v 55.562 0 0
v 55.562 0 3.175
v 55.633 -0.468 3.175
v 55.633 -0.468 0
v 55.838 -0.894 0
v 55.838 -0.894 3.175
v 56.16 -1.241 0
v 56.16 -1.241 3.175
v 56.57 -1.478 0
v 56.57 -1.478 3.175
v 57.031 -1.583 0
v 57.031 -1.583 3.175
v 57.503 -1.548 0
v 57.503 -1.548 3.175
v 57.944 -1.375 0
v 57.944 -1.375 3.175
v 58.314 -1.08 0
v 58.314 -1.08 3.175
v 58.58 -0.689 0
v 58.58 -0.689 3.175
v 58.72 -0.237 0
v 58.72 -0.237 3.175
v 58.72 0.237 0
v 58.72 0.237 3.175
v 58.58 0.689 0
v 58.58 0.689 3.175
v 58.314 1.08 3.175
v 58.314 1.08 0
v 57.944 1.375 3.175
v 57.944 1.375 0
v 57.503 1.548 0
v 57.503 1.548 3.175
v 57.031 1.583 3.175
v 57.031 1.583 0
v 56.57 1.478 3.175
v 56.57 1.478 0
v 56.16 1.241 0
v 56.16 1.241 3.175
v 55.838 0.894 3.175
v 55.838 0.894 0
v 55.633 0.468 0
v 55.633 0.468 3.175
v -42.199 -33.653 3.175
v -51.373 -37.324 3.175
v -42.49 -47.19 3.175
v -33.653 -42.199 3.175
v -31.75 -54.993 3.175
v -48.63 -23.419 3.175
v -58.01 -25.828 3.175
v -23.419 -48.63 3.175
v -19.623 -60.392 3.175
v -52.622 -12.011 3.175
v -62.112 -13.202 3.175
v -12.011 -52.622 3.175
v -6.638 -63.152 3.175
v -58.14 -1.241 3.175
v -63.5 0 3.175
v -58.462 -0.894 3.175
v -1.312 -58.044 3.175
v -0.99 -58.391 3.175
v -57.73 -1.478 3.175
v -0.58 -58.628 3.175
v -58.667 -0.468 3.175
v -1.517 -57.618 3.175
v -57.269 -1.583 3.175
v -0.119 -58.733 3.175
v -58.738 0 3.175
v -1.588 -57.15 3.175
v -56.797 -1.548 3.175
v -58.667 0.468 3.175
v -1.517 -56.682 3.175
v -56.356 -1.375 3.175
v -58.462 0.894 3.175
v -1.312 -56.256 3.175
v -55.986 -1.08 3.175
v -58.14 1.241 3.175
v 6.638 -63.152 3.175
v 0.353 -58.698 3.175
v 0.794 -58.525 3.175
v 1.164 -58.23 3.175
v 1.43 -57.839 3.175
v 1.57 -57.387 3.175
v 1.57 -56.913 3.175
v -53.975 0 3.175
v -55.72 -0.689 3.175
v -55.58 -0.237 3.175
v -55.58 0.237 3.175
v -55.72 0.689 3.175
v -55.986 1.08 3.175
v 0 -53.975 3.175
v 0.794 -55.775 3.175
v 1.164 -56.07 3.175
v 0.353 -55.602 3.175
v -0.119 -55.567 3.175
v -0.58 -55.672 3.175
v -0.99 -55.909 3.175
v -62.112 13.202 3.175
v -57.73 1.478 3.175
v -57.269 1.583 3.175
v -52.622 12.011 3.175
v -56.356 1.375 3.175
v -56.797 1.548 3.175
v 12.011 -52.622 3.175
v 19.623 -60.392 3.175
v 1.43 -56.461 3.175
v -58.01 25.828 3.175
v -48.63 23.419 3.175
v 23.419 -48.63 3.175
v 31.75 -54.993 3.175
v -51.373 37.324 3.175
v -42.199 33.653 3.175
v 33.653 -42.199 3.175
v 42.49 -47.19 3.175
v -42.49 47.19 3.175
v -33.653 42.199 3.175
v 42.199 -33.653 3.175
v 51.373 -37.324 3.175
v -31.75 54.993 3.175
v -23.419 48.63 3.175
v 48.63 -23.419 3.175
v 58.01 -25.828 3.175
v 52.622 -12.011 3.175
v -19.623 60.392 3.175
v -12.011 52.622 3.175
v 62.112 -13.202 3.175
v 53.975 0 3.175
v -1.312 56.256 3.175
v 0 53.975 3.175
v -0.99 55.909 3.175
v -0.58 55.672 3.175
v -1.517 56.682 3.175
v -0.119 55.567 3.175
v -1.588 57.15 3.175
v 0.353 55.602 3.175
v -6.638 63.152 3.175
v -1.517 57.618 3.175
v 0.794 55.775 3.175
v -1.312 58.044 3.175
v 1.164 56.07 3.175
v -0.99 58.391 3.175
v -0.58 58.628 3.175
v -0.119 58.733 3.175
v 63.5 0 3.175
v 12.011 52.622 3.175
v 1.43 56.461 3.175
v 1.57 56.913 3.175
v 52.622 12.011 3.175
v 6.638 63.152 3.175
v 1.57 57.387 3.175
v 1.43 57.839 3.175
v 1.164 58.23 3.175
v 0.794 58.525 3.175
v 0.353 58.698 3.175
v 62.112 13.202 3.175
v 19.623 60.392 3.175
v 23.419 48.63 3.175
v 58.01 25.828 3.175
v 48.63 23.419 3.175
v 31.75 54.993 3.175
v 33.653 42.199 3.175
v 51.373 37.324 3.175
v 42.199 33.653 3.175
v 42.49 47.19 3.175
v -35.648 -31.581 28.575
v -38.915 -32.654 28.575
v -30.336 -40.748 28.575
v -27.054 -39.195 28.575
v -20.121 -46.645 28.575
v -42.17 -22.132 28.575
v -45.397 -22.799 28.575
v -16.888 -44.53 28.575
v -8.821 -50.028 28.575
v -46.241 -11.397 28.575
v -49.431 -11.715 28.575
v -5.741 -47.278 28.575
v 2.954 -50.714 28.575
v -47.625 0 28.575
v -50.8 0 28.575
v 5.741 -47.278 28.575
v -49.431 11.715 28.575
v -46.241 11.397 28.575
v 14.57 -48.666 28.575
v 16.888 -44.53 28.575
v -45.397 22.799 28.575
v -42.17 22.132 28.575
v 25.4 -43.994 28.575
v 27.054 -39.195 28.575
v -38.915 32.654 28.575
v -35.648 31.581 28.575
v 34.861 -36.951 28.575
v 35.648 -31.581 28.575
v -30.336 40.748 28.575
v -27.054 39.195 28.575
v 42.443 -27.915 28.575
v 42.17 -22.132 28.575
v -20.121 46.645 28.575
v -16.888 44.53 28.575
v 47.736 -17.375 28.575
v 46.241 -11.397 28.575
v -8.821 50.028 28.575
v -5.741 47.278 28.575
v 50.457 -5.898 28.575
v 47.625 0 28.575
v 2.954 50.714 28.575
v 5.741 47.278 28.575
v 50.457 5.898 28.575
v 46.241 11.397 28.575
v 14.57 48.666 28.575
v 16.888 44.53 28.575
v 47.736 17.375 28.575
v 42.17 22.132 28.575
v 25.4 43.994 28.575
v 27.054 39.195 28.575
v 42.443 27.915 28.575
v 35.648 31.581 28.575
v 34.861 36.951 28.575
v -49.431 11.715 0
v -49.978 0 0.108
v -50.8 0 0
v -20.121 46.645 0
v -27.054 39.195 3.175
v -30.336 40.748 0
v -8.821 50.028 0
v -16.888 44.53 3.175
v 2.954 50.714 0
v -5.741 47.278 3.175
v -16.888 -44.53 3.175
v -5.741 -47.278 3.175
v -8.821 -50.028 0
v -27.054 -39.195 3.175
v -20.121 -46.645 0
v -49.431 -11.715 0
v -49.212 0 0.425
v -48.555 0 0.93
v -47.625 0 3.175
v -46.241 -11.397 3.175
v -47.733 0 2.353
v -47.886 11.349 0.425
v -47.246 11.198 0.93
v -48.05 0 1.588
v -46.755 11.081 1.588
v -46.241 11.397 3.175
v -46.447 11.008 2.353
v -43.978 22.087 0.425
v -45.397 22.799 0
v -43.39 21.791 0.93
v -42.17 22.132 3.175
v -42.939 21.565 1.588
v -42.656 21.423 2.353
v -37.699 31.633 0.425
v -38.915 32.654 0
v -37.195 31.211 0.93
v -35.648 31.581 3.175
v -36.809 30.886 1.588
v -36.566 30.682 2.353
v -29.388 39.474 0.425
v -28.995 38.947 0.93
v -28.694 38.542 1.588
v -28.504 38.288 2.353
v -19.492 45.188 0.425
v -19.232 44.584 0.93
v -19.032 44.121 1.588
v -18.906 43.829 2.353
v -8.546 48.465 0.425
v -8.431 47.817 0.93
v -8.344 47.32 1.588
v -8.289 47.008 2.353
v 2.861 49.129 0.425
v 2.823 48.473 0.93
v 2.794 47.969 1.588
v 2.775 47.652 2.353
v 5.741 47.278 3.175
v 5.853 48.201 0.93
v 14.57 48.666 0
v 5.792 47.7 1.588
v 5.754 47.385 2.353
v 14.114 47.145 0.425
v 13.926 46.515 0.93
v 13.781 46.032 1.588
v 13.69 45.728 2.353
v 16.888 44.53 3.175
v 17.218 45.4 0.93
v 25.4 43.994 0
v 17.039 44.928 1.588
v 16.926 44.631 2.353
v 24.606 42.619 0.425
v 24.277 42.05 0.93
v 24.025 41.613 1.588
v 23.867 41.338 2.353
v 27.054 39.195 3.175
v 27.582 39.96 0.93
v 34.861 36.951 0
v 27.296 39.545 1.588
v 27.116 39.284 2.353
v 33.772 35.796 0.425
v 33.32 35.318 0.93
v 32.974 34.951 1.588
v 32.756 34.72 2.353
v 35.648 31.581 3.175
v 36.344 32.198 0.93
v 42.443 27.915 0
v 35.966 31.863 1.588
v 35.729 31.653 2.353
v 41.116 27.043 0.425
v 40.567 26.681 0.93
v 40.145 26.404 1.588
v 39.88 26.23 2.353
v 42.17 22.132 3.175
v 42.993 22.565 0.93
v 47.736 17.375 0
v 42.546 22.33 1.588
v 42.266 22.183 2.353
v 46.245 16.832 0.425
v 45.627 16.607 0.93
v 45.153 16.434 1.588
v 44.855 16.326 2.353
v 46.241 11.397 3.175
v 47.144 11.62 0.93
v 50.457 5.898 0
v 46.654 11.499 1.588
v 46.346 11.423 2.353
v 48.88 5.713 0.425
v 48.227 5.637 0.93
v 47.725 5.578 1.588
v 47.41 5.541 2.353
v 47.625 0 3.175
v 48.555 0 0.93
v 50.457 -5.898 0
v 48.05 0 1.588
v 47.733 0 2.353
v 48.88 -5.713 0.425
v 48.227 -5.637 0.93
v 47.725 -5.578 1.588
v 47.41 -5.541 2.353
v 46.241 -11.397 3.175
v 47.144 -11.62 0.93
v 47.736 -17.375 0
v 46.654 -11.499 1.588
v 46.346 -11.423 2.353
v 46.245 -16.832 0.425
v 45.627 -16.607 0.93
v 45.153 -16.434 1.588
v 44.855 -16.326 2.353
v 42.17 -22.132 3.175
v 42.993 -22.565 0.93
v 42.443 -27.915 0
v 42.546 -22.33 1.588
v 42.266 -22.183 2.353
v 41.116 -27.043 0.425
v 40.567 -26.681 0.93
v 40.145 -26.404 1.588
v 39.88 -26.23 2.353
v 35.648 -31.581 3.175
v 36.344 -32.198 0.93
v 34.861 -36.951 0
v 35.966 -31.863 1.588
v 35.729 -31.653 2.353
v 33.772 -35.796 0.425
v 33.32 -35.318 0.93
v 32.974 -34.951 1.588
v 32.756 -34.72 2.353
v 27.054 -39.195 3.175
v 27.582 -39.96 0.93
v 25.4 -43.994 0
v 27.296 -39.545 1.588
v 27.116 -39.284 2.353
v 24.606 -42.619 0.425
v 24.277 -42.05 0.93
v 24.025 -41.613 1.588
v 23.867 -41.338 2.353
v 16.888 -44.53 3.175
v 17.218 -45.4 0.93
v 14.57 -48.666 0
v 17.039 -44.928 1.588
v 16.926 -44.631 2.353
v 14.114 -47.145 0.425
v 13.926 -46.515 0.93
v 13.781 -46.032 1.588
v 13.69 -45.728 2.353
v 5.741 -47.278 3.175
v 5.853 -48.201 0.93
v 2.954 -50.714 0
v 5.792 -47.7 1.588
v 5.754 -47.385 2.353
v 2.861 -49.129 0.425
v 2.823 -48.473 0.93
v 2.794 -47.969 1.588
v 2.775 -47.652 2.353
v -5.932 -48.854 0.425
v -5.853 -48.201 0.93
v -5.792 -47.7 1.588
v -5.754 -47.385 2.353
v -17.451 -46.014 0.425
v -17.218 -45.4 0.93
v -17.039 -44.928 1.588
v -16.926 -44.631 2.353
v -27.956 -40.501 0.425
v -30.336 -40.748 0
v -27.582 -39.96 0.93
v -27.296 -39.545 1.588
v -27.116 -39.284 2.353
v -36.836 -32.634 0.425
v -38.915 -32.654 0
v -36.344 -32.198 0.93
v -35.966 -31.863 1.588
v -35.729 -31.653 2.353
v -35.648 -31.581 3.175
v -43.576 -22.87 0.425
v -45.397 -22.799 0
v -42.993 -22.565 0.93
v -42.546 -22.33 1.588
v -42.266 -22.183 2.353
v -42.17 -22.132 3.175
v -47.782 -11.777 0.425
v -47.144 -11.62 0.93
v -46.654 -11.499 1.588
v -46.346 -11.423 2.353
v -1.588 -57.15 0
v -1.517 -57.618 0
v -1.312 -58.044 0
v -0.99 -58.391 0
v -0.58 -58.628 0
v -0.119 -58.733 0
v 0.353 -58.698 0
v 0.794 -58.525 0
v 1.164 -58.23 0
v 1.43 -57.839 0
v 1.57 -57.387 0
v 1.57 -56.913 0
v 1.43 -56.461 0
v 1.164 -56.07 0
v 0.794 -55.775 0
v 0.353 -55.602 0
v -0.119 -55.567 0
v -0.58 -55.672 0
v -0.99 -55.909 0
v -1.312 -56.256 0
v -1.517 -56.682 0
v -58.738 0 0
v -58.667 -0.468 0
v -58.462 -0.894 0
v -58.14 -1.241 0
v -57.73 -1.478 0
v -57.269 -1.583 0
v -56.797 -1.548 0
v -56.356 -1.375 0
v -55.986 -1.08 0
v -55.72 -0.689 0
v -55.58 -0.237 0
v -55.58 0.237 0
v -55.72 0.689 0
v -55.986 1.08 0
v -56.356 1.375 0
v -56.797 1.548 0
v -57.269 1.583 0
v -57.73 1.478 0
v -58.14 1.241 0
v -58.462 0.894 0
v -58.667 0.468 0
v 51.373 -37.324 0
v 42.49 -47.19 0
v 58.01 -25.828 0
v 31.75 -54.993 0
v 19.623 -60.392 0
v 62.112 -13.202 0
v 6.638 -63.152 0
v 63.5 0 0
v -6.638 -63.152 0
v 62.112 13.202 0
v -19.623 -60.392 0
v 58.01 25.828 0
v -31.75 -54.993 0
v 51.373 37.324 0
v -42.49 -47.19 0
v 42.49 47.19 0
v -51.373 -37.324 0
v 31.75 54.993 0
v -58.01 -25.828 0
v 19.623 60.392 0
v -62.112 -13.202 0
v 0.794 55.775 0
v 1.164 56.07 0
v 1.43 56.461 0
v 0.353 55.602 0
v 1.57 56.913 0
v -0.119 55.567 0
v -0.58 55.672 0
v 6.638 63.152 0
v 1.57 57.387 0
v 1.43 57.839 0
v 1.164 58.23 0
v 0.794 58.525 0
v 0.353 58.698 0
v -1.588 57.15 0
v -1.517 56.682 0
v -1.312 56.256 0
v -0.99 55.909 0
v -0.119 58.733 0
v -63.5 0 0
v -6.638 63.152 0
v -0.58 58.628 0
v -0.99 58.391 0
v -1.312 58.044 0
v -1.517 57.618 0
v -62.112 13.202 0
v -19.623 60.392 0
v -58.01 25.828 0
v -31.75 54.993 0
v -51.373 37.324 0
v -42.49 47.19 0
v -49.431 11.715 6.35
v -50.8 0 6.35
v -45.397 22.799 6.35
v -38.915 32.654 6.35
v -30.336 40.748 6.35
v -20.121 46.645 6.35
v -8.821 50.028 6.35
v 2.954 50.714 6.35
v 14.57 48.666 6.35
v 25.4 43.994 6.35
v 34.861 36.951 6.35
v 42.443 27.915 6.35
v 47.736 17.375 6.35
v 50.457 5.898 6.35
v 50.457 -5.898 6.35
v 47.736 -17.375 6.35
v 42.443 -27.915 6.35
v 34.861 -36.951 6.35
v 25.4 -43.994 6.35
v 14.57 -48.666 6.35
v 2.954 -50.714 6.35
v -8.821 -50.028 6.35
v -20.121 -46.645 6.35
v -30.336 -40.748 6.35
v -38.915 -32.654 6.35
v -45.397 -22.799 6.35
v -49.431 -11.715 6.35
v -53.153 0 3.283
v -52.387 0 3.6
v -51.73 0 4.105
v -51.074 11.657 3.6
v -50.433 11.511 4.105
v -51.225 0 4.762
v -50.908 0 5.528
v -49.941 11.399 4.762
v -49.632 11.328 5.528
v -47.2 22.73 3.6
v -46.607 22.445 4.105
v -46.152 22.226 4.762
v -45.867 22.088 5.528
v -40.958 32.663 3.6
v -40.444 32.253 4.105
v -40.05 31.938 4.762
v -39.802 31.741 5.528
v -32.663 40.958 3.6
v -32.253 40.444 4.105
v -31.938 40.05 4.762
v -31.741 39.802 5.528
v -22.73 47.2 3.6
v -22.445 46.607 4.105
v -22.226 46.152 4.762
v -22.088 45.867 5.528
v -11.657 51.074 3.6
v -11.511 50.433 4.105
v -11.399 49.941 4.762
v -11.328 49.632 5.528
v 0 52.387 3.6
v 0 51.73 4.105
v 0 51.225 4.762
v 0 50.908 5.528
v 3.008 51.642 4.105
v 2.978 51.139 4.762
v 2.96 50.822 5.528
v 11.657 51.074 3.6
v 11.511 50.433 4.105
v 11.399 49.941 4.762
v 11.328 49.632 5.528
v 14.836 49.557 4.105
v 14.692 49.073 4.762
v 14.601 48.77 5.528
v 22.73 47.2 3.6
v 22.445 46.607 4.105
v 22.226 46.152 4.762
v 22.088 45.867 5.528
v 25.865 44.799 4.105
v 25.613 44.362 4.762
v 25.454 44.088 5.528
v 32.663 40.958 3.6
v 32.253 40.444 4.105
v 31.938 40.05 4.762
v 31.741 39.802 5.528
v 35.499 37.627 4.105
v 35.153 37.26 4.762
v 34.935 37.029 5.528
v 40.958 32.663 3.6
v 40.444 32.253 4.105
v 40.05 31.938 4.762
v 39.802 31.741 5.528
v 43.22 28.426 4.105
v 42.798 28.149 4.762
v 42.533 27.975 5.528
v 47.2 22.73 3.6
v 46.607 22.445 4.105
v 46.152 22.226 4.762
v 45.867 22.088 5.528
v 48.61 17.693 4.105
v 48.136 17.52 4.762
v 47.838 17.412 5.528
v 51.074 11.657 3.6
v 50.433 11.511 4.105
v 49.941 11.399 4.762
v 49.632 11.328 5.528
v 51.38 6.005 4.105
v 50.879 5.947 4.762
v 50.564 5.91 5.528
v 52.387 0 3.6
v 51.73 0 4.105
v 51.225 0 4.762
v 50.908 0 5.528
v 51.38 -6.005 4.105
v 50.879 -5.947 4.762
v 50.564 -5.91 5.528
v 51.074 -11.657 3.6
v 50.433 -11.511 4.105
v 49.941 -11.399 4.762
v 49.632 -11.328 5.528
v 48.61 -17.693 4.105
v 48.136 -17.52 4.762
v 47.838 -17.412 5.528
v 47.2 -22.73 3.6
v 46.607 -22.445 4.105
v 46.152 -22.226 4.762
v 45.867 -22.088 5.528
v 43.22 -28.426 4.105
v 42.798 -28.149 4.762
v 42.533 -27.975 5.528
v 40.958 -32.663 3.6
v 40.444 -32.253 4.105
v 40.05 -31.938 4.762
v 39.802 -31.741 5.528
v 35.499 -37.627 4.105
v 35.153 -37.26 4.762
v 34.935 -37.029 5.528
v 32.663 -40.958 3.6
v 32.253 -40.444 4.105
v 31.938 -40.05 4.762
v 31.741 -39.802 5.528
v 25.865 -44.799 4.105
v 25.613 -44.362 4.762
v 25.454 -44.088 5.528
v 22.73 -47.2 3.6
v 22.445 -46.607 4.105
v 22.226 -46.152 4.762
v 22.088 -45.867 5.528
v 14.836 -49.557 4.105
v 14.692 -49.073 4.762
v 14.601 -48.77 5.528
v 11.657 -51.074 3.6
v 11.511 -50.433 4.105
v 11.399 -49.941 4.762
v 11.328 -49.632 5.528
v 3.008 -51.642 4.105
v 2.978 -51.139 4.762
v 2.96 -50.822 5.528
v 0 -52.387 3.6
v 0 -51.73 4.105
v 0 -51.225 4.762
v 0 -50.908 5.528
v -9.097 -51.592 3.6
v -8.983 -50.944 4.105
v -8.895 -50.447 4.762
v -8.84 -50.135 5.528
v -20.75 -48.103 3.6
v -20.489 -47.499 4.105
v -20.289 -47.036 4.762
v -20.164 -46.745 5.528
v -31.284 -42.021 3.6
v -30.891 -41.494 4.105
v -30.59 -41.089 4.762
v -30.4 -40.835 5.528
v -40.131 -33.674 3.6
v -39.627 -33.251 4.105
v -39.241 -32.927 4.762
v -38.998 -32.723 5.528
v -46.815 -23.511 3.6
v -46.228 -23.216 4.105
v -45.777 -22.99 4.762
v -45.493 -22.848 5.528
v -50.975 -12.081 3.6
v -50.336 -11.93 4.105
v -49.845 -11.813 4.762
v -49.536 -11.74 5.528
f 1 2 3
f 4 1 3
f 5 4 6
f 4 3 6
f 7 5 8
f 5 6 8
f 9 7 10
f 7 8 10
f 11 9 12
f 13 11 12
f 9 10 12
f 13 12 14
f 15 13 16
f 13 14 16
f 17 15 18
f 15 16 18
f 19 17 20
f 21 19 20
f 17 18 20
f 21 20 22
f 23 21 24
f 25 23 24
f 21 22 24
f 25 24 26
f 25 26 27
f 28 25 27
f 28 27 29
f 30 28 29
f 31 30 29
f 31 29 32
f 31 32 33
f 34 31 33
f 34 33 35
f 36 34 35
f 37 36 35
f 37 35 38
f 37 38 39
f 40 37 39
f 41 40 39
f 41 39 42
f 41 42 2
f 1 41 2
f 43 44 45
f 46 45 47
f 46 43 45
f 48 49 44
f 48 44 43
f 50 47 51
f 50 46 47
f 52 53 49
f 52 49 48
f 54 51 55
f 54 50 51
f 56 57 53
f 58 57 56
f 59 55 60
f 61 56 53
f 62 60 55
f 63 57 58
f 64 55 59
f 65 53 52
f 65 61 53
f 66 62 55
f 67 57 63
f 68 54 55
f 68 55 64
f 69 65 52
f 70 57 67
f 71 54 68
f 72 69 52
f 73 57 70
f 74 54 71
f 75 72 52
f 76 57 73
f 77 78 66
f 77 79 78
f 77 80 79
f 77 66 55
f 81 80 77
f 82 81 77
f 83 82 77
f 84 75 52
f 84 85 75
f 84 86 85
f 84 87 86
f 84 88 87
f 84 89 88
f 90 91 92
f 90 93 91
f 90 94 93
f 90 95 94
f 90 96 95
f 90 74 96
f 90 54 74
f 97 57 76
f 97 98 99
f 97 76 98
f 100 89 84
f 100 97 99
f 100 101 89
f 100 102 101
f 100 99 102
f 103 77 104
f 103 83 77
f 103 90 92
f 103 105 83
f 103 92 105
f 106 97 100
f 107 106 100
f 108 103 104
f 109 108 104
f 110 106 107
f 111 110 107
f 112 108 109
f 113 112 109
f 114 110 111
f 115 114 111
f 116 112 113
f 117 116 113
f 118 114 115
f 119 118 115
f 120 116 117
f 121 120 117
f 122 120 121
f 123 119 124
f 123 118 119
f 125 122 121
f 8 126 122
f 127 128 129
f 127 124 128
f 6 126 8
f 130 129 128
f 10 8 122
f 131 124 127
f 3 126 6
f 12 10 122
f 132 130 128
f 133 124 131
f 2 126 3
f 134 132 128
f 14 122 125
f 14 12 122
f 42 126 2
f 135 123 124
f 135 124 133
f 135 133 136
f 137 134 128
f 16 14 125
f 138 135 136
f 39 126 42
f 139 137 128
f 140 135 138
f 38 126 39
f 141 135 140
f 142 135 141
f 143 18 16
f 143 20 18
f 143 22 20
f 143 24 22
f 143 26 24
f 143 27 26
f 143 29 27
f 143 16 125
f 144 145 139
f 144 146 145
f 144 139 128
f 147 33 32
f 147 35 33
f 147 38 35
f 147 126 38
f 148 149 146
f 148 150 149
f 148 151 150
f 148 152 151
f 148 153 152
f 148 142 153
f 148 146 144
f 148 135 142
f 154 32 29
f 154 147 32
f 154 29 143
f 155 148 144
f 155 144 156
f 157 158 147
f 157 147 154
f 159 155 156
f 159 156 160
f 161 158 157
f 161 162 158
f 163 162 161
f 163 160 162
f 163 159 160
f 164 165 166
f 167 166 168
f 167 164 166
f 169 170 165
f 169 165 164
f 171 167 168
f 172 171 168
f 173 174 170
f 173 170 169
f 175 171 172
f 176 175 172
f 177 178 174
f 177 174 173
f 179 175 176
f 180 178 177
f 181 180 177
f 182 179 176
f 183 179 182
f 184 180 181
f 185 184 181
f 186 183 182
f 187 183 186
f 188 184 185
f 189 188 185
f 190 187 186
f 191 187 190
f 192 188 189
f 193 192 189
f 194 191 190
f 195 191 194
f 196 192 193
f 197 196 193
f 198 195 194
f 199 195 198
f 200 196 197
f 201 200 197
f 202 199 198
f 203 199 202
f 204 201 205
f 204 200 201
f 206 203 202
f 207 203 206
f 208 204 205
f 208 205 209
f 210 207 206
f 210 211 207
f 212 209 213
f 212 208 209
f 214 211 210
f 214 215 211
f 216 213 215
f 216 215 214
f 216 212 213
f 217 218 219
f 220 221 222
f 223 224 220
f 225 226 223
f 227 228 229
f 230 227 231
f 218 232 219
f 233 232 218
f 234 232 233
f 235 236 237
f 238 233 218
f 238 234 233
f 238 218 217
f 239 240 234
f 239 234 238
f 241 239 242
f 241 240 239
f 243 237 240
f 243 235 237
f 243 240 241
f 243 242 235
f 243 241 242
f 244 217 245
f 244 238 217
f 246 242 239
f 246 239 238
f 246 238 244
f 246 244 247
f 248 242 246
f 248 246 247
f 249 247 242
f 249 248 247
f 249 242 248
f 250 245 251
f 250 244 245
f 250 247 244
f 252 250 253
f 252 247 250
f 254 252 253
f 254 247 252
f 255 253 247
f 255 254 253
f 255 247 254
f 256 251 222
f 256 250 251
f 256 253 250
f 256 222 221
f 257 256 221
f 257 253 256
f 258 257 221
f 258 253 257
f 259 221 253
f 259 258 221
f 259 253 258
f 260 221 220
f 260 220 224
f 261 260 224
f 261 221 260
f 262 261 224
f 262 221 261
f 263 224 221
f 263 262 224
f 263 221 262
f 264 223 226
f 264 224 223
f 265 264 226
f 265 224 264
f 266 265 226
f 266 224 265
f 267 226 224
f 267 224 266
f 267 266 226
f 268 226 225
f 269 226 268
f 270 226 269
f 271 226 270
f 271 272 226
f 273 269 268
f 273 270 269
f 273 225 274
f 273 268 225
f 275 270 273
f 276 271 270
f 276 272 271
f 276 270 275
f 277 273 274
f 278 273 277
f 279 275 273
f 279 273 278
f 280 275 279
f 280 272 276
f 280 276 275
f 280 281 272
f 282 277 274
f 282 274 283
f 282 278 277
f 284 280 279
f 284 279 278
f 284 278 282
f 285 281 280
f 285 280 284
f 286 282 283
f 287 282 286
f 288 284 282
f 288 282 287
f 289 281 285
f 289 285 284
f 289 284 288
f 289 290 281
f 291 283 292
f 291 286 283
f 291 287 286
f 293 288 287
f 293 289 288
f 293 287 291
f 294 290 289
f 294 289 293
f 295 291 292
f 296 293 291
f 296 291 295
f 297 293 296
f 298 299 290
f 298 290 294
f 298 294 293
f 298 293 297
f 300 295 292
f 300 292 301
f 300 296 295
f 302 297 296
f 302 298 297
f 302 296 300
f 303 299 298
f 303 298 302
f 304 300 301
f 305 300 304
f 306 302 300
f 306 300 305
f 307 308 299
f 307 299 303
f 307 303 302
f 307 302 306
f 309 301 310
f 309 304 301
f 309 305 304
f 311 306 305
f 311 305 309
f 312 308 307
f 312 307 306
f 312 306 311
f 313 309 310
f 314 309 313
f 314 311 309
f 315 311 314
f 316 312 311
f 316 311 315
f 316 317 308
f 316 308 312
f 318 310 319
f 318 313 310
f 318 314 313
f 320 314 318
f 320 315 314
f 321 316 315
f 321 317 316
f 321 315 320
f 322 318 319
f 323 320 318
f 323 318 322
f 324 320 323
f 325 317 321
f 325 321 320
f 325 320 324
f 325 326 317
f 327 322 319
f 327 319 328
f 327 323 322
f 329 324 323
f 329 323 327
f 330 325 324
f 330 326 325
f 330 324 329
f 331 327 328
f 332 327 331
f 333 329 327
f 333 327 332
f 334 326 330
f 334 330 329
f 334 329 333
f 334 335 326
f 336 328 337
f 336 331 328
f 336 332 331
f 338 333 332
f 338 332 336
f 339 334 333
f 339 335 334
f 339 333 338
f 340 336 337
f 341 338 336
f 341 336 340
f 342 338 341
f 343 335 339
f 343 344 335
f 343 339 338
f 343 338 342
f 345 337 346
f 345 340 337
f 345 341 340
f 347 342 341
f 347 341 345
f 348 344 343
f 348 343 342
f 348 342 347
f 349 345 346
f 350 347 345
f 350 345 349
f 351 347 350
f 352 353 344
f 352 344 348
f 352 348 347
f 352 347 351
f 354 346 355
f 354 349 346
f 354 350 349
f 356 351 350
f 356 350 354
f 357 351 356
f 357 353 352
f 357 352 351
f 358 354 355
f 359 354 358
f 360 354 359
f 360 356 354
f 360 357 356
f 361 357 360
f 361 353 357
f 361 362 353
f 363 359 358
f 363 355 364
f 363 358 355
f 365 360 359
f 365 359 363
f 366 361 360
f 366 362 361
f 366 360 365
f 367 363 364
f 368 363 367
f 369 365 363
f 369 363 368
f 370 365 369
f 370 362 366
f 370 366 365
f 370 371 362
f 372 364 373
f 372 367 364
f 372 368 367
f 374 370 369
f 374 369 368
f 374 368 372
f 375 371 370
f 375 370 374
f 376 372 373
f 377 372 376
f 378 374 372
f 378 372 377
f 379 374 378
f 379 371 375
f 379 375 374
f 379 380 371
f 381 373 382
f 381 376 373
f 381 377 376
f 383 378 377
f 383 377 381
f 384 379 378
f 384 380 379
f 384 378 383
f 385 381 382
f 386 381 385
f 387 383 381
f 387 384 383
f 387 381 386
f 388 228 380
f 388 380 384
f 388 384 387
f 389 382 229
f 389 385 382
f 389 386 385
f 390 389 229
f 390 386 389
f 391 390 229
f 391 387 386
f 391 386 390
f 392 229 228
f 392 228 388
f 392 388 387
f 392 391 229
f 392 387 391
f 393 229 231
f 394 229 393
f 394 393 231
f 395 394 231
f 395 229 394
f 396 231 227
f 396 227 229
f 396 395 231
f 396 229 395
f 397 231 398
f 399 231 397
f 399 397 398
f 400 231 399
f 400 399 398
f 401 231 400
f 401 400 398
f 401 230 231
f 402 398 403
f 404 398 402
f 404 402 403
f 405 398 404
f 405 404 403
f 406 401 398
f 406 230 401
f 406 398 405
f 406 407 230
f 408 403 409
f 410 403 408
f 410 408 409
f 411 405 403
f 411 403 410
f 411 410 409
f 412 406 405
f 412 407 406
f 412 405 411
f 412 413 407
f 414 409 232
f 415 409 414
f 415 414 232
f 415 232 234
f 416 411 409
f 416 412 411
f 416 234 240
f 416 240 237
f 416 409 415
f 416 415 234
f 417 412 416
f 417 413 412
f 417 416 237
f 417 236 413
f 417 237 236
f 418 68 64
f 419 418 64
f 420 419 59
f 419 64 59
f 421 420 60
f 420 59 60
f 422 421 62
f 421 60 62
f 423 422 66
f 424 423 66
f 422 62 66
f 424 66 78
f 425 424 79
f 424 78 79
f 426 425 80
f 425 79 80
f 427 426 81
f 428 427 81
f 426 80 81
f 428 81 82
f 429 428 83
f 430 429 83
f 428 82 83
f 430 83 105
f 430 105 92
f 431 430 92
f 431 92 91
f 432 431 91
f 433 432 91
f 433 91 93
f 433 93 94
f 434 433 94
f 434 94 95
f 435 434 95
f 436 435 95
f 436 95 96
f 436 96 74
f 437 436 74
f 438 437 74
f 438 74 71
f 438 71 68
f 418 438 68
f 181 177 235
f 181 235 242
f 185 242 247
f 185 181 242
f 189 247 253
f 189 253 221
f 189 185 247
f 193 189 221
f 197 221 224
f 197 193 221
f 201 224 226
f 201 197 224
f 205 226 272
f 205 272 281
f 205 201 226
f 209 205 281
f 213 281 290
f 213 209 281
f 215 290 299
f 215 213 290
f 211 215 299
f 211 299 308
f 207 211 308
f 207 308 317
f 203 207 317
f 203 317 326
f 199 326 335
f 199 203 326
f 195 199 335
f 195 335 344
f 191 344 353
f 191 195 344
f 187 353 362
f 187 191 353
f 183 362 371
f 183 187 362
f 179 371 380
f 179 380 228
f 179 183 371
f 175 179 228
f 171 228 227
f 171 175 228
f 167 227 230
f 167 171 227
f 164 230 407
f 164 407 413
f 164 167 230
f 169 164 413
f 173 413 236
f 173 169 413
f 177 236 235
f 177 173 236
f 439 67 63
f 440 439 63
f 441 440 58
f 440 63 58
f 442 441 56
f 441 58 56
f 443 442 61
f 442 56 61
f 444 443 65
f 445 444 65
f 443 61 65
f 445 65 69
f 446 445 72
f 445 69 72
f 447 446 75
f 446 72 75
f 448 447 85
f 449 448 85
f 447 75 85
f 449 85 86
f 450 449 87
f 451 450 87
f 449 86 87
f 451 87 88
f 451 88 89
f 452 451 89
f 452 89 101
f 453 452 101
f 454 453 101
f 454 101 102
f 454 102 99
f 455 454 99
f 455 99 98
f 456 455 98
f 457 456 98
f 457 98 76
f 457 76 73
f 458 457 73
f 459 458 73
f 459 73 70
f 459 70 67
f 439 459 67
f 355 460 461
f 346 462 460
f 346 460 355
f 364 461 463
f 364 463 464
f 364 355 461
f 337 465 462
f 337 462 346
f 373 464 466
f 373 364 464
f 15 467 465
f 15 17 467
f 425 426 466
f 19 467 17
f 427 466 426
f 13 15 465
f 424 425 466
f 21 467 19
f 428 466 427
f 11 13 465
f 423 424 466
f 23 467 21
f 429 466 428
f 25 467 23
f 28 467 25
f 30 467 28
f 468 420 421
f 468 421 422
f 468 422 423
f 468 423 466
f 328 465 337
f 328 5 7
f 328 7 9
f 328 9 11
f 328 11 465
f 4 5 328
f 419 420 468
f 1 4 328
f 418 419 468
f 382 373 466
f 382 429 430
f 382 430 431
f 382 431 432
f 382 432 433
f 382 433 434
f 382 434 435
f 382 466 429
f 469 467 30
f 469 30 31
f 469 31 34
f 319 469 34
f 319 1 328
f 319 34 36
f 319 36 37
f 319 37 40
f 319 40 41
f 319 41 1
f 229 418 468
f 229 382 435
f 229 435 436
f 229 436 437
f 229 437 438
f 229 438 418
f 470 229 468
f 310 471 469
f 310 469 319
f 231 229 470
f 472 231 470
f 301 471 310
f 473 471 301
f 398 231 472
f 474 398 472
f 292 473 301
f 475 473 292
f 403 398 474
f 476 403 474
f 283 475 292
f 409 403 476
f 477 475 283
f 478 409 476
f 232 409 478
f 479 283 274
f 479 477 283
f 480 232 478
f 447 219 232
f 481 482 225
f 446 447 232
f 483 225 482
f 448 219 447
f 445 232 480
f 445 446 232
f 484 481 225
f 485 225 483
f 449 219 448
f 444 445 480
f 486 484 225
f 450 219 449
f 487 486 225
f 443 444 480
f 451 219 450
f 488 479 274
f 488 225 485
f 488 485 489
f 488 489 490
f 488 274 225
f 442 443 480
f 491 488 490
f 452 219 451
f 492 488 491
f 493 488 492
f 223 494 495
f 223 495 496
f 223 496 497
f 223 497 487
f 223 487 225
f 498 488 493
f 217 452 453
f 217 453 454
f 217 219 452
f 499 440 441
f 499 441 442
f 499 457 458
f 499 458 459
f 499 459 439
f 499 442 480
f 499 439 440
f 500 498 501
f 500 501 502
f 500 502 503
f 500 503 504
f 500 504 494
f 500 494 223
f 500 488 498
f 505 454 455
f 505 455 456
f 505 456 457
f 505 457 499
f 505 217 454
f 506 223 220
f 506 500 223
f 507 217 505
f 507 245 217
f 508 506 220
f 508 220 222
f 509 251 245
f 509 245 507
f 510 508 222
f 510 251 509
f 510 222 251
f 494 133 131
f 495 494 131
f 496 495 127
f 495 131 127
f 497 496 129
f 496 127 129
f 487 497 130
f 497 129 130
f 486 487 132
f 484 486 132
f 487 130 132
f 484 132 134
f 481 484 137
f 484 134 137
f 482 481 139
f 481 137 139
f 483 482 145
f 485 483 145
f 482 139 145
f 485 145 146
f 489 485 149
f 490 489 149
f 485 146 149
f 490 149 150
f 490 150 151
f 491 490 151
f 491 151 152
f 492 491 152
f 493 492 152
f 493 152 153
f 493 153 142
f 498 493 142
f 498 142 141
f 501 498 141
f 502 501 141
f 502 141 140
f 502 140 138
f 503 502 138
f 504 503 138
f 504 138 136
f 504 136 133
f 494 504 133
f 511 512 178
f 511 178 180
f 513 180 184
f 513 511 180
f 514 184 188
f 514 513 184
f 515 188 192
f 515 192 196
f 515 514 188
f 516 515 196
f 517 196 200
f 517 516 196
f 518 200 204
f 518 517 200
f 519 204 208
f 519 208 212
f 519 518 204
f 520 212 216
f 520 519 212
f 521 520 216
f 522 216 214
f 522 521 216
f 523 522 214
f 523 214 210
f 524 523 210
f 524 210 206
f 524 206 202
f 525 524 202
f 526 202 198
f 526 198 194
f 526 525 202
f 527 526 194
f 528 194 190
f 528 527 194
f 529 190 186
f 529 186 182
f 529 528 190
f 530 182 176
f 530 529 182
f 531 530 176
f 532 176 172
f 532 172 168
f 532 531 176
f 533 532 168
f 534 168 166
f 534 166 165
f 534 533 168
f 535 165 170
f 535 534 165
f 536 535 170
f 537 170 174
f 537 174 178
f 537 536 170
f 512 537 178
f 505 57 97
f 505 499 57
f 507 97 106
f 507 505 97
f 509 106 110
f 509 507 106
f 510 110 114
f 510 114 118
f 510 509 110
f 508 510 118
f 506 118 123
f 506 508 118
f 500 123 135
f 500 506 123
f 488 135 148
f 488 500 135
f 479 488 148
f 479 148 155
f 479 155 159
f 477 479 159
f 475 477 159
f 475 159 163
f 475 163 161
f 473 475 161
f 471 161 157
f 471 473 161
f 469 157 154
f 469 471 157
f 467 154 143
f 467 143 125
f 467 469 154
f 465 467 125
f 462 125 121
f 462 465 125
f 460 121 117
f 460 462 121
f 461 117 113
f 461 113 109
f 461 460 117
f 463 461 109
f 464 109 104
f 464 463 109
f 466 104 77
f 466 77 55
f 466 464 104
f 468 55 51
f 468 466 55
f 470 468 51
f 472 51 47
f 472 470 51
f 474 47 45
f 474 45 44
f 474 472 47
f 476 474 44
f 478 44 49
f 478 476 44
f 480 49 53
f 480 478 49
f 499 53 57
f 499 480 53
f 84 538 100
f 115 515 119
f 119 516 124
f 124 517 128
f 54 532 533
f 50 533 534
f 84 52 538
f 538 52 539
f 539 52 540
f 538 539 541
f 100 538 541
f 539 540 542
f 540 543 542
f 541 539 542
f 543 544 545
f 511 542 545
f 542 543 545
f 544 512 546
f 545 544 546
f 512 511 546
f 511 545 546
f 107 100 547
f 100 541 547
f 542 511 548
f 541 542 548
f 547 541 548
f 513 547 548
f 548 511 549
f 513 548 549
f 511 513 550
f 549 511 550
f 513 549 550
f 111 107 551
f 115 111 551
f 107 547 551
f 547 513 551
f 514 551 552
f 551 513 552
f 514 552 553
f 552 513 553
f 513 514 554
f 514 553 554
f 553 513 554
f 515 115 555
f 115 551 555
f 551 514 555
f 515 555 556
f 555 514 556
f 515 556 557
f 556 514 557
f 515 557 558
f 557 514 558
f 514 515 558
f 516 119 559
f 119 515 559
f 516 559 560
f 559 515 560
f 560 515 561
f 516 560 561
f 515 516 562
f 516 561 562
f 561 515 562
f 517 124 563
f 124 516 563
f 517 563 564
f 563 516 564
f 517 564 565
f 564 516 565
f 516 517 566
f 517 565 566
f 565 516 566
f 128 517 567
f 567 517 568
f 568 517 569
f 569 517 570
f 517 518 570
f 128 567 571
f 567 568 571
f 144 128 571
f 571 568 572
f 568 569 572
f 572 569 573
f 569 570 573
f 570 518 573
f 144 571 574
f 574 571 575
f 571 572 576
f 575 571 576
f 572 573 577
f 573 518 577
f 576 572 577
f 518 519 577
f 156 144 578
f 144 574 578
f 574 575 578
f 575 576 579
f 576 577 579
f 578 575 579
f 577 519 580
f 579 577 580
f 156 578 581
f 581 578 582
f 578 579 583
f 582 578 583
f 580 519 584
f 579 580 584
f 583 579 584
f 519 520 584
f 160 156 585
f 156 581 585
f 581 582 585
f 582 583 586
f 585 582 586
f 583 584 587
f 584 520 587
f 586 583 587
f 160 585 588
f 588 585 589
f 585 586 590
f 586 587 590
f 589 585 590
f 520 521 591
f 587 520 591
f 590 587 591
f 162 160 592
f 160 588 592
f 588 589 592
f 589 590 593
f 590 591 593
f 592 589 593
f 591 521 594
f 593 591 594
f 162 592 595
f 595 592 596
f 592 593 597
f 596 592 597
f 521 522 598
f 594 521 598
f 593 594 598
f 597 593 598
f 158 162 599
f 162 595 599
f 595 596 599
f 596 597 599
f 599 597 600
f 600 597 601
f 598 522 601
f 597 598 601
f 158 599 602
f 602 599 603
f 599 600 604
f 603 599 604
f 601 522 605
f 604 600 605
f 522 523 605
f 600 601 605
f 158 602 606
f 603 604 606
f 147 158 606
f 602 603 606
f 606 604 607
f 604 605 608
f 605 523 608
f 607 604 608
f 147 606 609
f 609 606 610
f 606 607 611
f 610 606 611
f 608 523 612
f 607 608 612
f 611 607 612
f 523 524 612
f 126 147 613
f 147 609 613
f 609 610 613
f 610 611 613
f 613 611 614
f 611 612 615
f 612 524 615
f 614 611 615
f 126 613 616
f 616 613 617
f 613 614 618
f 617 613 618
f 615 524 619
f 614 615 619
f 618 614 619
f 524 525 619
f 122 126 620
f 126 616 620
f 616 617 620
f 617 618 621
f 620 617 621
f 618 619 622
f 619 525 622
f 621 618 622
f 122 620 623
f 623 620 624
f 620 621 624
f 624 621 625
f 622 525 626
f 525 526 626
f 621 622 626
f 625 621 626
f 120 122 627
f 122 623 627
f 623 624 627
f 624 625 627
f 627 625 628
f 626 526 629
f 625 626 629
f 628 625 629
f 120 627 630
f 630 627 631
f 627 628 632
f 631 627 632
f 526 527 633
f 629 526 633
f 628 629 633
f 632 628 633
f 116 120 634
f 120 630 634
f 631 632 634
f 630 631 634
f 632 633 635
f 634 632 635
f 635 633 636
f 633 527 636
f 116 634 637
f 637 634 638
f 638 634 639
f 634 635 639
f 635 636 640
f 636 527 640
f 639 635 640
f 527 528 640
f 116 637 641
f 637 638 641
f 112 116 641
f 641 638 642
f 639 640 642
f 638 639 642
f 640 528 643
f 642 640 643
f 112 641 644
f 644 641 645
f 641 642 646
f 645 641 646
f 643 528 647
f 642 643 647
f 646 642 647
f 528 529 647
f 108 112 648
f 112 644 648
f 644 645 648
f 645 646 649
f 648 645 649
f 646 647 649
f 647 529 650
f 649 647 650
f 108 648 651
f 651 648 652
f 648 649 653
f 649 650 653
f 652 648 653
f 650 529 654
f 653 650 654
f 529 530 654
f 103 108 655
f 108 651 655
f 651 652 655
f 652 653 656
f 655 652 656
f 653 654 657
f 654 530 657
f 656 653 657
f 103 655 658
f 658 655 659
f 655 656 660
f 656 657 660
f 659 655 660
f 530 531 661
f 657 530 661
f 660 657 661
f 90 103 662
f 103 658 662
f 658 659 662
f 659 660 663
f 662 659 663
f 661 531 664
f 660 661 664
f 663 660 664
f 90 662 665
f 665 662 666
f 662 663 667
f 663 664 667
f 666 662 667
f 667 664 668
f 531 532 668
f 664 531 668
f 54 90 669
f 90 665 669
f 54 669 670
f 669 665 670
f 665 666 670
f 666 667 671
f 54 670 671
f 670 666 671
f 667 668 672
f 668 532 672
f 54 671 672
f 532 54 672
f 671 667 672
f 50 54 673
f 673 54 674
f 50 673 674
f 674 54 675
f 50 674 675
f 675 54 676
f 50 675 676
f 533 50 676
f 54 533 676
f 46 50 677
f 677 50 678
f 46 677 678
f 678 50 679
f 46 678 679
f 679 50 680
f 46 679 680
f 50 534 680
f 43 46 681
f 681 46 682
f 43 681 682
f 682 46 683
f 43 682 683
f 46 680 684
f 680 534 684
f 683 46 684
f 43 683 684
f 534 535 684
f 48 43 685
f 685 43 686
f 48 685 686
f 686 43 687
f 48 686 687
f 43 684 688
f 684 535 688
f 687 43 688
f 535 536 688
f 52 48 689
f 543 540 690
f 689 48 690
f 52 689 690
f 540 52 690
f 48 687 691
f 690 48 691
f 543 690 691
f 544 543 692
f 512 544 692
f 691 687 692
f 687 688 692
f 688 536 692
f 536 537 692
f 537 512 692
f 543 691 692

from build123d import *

# Parameters (mm, degrees)
F3_D = 3.175
F4_R = 3.175
F5_R = 3.175


with BuildPart() as f1:
    # F0 (on Front) → F1 (revolve)
    with BuildSketch(Plane.XZ):
        Polygon((-63.5, 3.175), (-63.5, 0), (-47.625, 0), (-47.625, 28.575), (-50.8, 28.575), (-50.8, 3.175), align=None)
    revolve(axis=Axis((0, 0, 11.316922), (0, 0, -1)))

    # F3 (through all)
    with Locations(Plane(origin=(0, 0, 0), x_dir=(1, 0, 0), z_dir=(0, 0, -1))):
        with Locations((-57.15, 0), (0, 57.15), (57.15, 0), (0, -57.15)):
            Hole(F3_D / 2)

    # F4
    f4_edges = [f1.edges().sort_by_distance(p)[0] for p in [
        (47.625, 0, 0),
    ]]
    fillet(f4_edges, radius=F4_R)

    # F5
    f5_edges = [f1.edges().sort_by_distance(p)[0] for p in [
        (50.8, 0, 3.175),
    ]]
    fillet(f5_edges, radius=F5_R)


solid = f1.part
